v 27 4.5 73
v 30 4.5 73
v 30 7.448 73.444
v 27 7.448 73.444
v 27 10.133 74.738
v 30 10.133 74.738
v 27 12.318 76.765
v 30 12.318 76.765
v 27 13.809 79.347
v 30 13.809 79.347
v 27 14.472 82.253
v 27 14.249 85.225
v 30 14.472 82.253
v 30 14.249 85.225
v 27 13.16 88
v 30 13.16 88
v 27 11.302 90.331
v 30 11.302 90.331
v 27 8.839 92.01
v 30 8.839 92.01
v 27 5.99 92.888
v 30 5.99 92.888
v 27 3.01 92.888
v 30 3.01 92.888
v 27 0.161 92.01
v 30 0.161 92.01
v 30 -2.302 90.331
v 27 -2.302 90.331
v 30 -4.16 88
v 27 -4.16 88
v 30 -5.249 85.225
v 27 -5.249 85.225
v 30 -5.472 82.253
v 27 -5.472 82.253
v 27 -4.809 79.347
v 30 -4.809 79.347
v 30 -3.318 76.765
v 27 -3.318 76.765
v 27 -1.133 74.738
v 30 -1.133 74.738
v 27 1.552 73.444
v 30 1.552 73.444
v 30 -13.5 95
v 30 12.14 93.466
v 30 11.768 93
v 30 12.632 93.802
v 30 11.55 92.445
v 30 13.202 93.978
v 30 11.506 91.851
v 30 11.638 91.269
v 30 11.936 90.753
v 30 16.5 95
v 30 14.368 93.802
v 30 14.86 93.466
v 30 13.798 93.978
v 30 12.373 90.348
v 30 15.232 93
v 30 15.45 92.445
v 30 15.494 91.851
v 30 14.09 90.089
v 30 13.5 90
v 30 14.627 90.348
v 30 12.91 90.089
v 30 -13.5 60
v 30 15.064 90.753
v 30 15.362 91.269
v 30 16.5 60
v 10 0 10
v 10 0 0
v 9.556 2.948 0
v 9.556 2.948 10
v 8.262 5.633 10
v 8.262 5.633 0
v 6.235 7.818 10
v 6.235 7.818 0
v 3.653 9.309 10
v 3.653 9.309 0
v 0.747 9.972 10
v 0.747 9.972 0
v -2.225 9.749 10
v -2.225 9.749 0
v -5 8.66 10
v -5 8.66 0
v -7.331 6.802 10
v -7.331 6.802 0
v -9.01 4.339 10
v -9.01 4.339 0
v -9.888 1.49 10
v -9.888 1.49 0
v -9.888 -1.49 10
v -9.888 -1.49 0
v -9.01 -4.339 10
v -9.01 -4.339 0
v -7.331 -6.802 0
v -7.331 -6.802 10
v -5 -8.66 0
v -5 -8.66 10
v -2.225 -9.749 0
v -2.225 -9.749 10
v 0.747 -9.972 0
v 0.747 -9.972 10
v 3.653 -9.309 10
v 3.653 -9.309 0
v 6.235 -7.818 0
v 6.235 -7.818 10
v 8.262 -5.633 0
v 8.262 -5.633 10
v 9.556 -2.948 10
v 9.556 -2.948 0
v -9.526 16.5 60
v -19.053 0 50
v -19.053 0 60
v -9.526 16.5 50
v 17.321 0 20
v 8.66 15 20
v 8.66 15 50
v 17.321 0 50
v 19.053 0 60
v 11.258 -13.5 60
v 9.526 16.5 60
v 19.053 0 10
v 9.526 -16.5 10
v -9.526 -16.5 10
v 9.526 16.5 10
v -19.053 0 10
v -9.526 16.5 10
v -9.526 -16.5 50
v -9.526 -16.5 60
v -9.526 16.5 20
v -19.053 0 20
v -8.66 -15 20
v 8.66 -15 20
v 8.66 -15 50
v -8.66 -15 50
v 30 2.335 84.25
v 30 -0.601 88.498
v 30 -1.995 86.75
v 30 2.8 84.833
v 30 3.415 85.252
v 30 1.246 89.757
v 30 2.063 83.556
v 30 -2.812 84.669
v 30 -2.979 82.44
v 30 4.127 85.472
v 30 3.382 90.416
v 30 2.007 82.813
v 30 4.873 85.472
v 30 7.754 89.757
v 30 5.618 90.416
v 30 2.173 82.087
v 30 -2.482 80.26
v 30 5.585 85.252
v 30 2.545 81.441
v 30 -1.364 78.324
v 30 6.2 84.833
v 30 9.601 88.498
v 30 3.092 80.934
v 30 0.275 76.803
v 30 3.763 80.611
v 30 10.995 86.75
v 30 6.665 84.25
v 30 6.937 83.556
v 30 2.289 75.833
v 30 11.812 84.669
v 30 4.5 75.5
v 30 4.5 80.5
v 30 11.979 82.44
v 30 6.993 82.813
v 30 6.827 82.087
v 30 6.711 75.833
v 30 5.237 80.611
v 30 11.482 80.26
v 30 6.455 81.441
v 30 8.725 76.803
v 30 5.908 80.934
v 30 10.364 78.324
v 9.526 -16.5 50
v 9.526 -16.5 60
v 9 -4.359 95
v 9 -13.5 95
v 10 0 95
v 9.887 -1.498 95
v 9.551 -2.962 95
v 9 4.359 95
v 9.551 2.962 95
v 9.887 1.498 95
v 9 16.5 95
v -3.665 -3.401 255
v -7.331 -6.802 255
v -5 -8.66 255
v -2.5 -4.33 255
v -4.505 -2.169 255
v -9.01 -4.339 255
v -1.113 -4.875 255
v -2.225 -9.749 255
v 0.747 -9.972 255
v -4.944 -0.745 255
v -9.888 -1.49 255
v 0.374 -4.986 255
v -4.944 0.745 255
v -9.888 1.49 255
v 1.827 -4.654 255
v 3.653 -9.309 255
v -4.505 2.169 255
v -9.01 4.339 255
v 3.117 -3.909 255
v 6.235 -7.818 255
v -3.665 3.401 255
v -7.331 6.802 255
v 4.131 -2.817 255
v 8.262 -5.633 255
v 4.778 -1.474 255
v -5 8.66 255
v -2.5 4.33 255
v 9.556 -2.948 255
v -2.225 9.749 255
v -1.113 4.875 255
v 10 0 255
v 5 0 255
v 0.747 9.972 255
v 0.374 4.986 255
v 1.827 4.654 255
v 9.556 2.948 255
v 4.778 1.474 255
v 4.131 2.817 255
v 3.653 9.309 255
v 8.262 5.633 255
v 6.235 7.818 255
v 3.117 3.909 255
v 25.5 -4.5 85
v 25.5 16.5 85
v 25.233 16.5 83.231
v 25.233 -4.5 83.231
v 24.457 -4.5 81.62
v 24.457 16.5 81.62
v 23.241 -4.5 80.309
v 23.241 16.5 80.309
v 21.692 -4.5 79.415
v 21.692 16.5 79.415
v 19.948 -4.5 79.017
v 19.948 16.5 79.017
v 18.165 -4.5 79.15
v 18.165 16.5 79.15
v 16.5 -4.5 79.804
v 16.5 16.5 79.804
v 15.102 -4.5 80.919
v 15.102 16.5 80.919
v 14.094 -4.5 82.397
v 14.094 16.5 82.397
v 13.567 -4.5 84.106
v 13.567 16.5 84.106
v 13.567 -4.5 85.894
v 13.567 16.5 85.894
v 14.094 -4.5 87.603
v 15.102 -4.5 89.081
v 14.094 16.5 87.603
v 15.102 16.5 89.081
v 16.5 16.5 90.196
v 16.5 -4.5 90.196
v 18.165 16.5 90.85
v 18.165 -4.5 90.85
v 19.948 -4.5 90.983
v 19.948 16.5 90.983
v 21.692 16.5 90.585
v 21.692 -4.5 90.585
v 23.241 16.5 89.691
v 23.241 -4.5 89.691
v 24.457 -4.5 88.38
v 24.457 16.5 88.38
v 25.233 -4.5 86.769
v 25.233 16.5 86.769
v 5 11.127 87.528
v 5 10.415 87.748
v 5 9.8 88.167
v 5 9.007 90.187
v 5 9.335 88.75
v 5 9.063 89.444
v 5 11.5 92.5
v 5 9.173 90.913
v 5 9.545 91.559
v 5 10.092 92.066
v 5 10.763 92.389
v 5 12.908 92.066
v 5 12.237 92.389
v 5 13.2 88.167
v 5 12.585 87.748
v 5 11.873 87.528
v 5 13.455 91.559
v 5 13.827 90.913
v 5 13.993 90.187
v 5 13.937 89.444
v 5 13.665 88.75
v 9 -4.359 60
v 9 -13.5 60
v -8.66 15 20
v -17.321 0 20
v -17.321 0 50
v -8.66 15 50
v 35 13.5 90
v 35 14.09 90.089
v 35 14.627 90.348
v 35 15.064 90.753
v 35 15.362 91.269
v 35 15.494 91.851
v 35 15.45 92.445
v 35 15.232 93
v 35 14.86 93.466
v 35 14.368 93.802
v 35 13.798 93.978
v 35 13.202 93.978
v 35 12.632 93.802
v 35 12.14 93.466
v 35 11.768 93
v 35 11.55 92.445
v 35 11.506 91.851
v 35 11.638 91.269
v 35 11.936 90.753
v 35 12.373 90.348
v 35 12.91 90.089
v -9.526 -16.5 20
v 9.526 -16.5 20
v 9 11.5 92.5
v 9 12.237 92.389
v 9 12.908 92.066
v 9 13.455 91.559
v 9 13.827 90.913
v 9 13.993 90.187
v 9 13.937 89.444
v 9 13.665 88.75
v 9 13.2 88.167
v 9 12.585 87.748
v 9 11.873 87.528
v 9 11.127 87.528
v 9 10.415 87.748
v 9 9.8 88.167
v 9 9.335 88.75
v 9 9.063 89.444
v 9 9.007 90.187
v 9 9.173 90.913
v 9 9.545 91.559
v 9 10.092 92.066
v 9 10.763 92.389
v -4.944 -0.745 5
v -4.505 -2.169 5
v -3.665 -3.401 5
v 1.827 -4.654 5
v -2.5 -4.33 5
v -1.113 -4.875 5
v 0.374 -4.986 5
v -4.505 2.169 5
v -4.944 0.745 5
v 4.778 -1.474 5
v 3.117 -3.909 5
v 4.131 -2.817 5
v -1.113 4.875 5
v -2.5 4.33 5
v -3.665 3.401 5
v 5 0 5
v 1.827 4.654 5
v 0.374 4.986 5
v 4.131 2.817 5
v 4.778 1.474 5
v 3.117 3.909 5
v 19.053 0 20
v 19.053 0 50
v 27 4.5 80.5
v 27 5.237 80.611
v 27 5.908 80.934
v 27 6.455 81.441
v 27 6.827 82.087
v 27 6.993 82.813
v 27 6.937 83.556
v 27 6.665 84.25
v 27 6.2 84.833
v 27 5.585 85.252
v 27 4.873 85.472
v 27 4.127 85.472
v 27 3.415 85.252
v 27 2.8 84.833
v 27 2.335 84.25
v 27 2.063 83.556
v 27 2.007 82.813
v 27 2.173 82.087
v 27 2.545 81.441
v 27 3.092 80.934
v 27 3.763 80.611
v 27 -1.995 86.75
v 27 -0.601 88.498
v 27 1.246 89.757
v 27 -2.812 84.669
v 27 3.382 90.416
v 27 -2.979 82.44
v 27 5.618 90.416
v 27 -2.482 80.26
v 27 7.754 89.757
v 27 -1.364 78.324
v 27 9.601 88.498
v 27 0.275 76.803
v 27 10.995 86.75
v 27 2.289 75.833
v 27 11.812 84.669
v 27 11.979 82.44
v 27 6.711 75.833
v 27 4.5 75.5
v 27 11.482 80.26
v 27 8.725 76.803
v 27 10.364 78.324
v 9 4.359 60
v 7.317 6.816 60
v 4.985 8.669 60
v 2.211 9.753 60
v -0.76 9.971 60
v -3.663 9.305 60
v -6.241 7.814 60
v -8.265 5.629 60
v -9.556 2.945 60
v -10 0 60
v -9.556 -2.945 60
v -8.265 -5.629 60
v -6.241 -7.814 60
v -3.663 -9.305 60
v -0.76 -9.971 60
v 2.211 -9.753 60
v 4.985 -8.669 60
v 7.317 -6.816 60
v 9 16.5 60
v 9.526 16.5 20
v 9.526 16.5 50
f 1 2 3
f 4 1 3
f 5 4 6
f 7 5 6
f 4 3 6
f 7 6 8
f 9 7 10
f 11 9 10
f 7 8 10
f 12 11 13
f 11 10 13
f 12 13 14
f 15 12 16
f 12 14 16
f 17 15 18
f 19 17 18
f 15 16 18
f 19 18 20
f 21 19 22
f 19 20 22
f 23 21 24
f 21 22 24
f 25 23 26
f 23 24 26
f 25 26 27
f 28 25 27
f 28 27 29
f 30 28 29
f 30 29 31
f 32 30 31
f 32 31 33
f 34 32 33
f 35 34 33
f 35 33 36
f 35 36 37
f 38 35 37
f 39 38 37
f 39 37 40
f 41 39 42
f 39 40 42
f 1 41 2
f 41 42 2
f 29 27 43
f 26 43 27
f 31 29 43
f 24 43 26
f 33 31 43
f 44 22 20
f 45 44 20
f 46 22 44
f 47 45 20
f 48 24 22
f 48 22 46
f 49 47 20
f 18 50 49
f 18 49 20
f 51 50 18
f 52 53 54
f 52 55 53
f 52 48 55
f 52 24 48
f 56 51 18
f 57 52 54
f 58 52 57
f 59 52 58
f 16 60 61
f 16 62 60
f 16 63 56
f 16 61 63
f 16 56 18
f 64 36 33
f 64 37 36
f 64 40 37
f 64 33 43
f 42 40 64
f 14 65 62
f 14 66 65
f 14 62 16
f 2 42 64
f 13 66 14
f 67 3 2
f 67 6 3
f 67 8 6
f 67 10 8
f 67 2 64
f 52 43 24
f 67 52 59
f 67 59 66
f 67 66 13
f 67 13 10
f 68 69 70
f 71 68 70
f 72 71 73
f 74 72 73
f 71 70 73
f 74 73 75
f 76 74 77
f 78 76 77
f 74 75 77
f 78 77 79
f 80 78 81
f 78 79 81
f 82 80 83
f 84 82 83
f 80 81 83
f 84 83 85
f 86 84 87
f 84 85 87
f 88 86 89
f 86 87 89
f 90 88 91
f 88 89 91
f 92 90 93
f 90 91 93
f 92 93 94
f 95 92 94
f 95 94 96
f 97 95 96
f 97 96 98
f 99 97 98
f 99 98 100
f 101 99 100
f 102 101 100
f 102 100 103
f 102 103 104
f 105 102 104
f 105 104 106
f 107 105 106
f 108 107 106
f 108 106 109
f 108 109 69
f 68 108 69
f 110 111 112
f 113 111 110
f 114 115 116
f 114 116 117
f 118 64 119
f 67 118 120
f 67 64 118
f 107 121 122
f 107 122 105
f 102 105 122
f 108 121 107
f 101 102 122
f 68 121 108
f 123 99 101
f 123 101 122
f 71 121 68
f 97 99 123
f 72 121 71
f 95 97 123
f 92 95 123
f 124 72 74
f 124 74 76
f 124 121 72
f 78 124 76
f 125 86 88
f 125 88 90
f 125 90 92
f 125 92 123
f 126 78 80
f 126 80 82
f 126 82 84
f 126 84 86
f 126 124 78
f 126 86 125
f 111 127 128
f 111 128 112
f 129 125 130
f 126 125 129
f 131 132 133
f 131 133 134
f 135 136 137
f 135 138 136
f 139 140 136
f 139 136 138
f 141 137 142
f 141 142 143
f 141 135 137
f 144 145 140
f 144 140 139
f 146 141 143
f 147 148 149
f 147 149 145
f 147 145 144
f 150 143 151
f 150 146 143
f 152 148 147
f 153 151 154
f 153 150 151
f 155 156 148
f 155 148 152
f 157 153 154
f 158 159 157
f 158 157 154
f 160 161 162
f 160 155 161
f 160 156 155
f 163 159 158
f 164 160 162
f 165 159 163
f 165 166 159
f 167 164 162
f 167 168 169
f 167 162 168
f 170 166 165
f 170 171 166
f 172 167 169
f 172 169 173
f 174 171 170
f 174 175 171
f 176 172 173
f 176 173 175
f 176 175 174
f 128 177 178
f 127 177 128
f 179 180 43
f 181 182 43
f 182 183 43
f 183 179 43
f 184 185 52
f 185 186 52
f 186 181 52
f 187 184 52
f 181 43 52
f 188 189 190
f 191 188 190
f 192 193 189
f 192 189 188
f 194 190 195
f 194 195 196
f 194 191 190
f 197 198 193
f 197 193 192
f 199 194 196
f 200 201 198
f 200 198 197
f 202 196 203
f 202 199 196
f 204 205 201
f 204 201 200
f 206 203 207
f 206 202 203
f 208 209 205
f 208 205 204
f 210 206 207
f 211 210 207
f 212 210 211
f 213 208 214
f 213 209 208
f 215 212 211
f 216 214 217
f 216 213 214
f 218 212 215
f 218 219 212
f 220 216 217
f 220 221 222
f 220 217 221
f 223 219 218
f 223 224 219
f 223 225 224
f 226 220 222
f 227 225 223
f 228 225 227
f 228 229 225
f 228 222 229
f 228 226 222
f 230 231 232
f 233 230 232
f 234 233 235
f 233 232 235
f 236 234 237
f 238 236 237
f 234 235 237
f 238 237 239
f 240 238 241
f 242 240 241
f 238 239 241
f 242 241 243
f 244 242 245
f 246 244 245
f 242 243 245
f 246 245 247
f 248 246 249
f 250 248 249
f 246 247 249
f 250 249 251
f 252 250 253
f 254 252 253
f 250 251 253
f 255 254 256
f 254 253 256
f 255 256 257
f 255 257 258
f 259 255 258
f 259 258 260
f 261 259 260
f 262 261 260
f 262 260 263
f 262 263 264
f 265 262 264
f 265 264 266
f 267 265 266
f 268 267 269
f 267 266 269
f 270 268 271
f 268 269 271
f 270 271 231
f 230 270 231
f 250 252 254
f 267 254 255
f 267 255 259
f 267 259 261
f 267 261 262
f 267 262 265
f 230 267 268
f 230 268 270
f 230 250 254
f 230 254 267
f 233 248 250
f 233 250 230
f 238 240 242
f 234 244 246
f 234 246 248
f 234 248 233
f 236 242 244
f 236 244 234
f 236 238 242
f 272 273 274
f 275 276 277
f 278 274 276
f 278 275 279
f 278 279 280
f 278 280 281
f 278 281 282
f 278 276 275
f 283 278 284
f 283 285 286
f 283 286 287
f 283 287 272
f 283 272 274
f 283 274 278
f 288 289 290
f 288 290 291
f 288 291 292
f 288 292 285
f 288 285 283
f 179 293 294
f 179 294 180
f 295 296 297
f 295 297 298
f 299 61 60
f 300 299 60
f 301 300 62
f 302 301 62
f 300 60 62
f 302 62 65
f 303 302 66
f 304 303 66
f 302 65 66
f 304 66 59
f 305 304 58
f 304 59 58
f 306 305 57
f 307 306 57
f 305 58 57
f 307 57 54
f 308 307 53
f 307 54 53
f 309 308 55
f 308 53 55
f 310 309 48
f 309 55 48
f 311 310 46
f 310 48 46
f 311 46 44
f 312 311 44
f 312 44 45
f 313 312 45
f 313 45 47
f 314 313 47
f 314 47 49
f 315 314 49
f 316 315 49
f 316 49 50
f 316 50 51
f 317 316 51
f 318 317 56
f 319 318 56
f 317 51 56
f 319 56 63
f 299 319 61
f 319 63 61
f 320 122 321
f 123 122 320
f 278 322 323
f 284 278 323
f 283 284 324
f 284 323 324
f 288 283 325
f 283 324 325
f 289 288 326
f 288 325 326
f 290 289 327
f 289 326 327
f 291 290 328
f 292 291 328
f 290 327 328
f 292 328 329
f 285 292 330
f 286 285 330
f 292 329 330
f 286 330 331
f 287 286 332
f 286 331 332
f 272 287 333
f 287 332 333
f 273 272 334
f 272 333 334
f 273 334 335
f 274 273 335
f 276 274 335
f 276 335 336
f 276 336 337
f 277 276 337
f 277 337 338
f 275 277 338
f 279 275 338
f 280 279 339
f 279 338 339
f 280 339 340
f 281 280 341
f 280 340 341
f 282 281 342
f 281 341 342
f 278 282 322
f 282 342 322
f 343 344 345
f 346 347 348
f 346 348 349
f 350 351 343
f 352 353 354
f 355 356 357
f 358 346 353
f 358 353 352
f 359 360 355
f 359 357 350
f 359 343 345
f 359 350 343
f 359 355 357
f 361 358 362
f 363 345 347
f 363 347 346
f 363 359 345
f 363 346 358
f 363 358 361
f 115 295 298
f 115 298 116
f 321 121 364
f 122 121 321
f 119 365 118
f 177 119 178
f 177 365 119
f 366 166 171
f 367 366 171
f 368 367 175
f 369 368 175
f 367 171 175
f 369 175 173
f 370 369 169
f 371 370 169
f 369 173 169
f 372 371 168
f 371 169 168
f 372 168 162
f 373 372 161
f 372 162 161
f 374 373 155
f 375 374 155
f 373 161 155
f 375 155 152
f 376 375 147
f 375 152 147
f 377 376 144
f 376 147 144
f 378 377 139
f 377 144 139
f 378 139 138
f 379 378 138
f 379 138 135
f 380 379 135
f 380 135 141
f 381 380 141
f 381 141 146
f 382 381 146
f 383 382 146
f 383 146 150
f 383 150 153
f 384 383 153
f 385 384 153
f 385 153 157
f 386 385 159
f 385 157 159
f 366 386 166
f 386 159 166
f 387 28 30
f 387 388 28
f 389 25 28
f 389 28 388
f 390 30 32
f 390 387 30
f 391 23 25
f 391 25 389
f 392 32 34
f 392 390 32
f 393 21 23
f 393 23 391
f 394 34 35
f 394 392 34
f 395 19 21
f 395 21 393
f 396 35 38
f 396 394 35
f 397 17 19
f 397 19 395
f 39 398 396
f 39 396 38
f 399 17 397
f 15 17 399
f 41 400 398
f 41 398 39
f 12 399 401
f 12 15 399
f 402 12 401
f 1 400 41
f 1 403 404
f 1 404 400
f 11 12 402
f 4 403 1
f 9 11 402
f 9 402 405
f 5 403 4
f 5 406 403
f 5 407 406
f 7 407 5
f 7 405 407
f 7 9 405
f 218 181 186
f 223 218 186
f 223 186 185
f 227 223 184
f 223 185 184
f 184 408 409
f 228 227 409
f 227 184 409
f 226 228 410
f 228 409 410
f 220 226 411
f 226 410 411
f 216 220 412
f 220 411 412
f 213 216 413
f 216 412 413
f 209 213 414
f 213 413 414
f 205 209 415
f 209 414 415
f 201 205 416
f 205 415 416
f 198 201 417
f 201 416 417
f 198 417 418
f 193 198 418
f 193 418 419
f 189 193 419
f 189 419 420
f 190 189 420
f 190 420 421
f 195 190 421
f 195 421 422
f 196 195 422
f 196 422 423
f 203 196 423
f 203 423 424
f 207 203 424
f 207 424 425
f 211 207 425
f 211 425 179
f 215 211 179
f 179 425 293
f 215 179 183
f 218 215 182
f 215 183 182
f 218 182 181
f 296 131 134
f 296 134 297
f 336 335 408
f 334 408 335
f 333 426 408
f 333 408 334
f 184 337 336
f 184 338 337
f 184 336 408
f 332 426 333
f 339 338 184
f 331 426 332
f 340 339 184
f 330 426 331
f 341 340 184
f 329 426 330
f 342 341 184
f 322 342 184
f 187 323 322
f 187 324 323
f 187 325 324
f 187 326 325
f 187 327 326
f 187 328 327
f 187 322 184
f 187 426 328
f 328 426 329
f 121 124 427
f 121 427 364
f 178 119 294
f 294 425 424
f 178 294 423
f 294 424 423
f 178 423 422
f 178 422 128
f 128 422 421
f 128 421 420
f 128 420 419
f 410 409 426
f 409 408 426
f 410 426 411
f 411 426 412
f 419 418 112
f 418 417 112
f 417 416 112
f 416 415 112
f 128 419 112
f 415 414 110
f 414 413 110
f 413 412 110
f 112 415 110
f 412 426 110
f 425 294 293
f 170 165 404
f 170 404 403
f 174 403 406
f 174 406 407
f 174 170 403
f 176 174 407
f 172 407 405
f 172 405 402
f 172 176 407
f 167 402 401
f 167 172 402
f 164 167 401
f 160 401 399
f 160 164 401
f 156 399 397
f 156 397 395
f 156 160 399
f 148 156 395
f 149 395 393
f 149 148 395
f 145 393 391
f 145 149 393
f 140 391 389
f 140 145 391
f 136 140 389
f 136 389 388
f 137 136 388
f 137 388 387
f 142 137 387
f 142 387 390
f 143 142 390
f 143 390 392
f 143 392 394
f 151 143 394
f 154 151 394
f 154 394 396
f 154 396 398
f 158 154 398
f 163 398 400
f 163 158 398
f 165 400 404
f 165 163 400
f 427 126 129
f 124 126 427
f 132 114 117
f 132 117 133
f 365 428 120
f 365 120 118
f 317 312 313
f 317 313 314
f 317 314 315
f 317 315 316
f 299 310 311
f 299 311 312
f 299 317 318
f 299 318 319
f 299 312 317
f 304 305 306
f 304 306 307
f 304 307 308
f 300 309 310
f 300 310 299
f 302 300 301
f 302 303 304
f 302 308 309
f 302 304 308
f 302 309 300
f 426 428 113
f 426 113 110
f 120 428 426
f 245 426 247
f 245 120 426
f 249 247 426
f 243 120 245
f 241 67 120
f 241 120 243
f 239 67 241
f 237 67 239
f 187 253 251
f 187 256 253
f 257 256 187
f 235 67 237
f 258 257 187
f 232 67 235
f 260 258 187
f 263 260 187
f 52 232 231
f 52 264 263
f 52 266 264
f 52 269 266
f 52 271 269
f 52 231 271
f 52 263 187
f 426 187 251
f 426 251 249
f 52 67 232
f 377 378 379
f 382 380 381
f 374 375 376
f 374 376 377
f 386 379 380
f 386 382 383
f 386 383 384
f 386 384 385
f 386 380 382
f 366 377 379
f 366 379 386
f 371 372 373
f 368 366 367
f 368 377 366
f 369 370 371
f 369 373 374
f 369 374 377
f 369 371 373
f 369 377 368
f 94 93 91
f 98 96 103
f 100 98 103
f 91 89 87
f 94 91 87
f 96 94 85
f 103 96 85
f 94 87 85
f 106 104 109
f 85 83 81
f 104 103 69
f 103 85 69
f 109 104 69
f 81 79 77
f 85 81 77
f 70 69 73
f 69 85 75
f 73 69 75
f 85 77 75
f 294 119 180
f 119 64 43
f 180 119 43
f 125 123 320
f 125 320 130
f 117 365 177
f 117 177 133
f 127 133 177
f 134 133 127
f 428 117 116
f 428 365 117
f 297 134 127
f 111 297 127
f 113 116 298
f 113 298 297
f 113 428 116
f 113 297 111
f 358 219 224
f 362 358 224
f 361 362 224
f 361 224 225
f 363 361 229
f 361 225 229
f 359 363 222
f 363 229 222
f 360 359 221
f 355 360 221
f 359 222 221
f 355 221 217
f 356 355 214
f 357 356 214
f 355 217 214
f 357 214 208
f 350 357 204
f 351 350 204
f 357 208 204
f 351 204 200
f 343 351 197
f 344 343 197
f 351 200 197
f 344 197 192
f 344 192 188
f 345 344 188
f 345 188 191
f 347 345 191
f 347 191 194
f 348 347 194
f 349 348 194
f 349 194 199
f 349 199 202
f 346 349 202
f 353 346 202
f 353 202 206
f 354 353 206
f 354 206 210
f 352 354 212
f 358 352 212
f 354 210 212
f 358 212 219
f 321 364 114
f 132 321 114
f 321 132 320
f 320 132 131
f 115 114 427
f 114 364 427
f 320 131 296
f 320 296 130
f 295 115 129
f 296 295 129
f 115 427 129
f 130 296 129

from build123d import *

# Parameters (mm, degrees)
SKETCH1_R            = 10
BOSS_EXTRUDE1_DEPTH  = 255
SKETCH2_R            = 5
CUT_EXTRUDE1_DEPTH   = 250
BOSS_EXTRUDE2_START  = -10
SKETCH3_R            = 10
BOSS_EXTRUDE2_DEPTH  = 50
BOSS_EXTRUDE3_DEPTH  = 10
BOSS_EXTRUDE4_START  = -40
BOSS_EXTRUDE4_DEPTH  = 10
BOSS_EXTRUDE6_START  = 10
SKETCH5_W            = 35
SKETCH5_H            = 30
BOSS_EXTRUDE6_DEPTH  = 10
SKETCH6_W            = 35
SKETCH6_H            = 30
BOSS_EXTRUDE8_DEPTH  = 11
SKETCH7_R            = 6
CUT_EXTRUDE2_DEPTH   = 21
SKETCH8_R            = 2.5
BOSS_EXTRUDE9_DEPTH  = 4
SKETCH9_R            = 10
SKETCH9_R_2          = 7.5
SKETCH9_R_3          = 2.5
CUT_EXTRUDE3_DEPTH   = 3
SKETCH10_R           = 2
BOSS_EXTRUDE10_DEPTH = 5


with BuildPart() as part:
    # Sketch1 → Boss-Extrude1 (new body)
    with BuildSketch(Plane.XY):
        Circle(SKETCH1_R)
    extrude(amount=BOSS_EXTRUDE1_DEPTH)

    # Sketch2 → Cut-Extrude1 (cut)
    with BuildSketch(Plane.XY.offset(255)):
        Circle(SKETCH2_R)
    extrude(amount=-CUT_EXTRUDE1_DEPTH, mode=Mode.SUBTRACT)

    # Sketch3 → Boss-Extrude2 (add)
    with BuildSketch(Plane(origin=(0, 0, 0), x_dir=(-1, 0, 0), z_dir=(0, 0, -1)).offset(BOSS_EXTRUDE2_START)):
        Polygon((17.320508076, 0), (8.660254038, 15), (-8.660254038, 15), (-17.320508076, 0), (-8.660254038, -15), (8.660254038, -15), align=None)
        Circle(SKETCH3_R, mode=Mode.SUBTRACT)
    extrude(amount=-BOSS_EXTRUDE2_DEPTH)

    # Sketch4 → Boss-Extrude3 (add)
    with BuildSketch(Plane(origin=(0, 0, 10), x_dir=(-1, 0, 0), z_dir=(0, 0, -1))):
        Polygon((-9.526279442, -16.5), (9.526279442, -16.5), (19.052558883, 0), (9.526279442, 16.5), (-9.526279442, 16.5), (-19.052558883, 0), align=None)
        Polygon((8.660254038, 15), (-8.660254038, 15), (-17.320508076, 0), (-8.660254038, -15), (8.660254038, -15), (17.320508076, 0), align=None, mode=Mode.SUBTRACT)
    extrude(amount=-BOSS_EXTRUDE3_DEPTH)

    # Sketch4<2> → Boss-Extrude4 (add)
    with BuildSketch(Plane(origin=(0, 0, 10), x_dir=(-1, 0, 0), z_dir=(0, 0, -1)).offset(BOSS_EXTRUDE4_START)):
        Polygon((-9.526279442, -16.5), (9.526279442, -16.5), (19.052558883, 0), (9.526279442, 16.5), (-9.526279442, 16.5), (-19.052558883, 0), align=None)
        Polygon((8.660254038, 15), (-8.660254038, 15), (-17.320508076, 0), (-8.660254038, -15), (8.660254038, -15), (17.320508076, 0), align=None, mode=Mode.SUBTRACT)
    extrude(amount=-BOSS_EXTRUDE4_DEPTH)



with BuildPart() as body_2:
    # Sketch5 → Boss-Extrude6 (new body)
    with BuildSketch(Plane(origin=(10, 0, 0), x_dir=(0, 0, -1), z_dir=(1, 0, 0)).offset(BOSS_EXTRUDE6_START)):
        with Locations((-77.5, 1.5)):
            Rectangle(SKETCH5_W, SKETCH5_H)
    extrude(amount=BOSS_EXTRUDE6_DEPTH)


with BuildPart() as part_1:
    add(part.part)

    add(body_2.part)  # Boss-Extrude8 merges body 2
    # Sketch6 → Boss-Extrude8 (add)
    with BuildSketch(Plane.ZY.offset(-20)):
        with Locations((77.5, 1.5)):
            Rectangle(SKETCH6_W, SKETCH6_H)
    extrude(amount=BOSS_EXTRUDE8_DEPTH)

    # Sketch7 → Cut-Extrude2 (cut)
    with BuildSketch(Plane(origin=(0, 16.5, 0), x_dir=(1, 0, 0), z_dir=(0, 1, 0))):
        with Locations((19.5, -85)):
            Circle(SKETCH7_R)
    extrude(amount=-CUT_EXTRUDE2_DEPTH, mode=Mode.SUBTRACT)

    # Sketch8 → Boss-Extrude9 (add)
    with BuildSketch(Plane.ZY.offset(-9)):
        with Locations((90, 11.5)):
            Circle(SKETCH8_R)
    extrude(amount=BOSS_EXTRUDE9_DEPTH)

    # Sketch9 → Cut-Extrude3 (cut)
    # profile 1 of 2: a face of its own
    with BuildSketch(Plane(origin=(30, 0, 0), x_dir=(0, 0, -1), z_dir=(1, 0, 0))):
        with Locations((-83, 4.5)):
            Circle(SKETCH9_R)
        with Locations((-83, 4.5)):
            Circle(SKETCH9_R_2, mode=Mode.SUBTRACT)
    # profile 2 of 2: a face of its own
    with BuildSketch(Plane(origin=(30, 0, 0), x_dir=(0, 0, -1), z_dir=(1, 0, 0))):
        with Locations((-83, 4.5)):
            Circle(SKETCH9_R_3)
    extrude(amount=-CUT_EXTRUDE3_DEPTH, mode=Mode.SUBTRACT)

    # Sketch10 → Boss-Extrude10 (add)
    with BuildSketch(Plane(origin=(30, 0, 0), x_dir=(0, 0, -1), z_dir=(1, 0, 0))):
        with Locations((-92, 13.5)):
            Circle(SKETCH10_R)
    extrude(amount=BOSS_EXTRUDE10_DEPTH)


solid = part_1.part
